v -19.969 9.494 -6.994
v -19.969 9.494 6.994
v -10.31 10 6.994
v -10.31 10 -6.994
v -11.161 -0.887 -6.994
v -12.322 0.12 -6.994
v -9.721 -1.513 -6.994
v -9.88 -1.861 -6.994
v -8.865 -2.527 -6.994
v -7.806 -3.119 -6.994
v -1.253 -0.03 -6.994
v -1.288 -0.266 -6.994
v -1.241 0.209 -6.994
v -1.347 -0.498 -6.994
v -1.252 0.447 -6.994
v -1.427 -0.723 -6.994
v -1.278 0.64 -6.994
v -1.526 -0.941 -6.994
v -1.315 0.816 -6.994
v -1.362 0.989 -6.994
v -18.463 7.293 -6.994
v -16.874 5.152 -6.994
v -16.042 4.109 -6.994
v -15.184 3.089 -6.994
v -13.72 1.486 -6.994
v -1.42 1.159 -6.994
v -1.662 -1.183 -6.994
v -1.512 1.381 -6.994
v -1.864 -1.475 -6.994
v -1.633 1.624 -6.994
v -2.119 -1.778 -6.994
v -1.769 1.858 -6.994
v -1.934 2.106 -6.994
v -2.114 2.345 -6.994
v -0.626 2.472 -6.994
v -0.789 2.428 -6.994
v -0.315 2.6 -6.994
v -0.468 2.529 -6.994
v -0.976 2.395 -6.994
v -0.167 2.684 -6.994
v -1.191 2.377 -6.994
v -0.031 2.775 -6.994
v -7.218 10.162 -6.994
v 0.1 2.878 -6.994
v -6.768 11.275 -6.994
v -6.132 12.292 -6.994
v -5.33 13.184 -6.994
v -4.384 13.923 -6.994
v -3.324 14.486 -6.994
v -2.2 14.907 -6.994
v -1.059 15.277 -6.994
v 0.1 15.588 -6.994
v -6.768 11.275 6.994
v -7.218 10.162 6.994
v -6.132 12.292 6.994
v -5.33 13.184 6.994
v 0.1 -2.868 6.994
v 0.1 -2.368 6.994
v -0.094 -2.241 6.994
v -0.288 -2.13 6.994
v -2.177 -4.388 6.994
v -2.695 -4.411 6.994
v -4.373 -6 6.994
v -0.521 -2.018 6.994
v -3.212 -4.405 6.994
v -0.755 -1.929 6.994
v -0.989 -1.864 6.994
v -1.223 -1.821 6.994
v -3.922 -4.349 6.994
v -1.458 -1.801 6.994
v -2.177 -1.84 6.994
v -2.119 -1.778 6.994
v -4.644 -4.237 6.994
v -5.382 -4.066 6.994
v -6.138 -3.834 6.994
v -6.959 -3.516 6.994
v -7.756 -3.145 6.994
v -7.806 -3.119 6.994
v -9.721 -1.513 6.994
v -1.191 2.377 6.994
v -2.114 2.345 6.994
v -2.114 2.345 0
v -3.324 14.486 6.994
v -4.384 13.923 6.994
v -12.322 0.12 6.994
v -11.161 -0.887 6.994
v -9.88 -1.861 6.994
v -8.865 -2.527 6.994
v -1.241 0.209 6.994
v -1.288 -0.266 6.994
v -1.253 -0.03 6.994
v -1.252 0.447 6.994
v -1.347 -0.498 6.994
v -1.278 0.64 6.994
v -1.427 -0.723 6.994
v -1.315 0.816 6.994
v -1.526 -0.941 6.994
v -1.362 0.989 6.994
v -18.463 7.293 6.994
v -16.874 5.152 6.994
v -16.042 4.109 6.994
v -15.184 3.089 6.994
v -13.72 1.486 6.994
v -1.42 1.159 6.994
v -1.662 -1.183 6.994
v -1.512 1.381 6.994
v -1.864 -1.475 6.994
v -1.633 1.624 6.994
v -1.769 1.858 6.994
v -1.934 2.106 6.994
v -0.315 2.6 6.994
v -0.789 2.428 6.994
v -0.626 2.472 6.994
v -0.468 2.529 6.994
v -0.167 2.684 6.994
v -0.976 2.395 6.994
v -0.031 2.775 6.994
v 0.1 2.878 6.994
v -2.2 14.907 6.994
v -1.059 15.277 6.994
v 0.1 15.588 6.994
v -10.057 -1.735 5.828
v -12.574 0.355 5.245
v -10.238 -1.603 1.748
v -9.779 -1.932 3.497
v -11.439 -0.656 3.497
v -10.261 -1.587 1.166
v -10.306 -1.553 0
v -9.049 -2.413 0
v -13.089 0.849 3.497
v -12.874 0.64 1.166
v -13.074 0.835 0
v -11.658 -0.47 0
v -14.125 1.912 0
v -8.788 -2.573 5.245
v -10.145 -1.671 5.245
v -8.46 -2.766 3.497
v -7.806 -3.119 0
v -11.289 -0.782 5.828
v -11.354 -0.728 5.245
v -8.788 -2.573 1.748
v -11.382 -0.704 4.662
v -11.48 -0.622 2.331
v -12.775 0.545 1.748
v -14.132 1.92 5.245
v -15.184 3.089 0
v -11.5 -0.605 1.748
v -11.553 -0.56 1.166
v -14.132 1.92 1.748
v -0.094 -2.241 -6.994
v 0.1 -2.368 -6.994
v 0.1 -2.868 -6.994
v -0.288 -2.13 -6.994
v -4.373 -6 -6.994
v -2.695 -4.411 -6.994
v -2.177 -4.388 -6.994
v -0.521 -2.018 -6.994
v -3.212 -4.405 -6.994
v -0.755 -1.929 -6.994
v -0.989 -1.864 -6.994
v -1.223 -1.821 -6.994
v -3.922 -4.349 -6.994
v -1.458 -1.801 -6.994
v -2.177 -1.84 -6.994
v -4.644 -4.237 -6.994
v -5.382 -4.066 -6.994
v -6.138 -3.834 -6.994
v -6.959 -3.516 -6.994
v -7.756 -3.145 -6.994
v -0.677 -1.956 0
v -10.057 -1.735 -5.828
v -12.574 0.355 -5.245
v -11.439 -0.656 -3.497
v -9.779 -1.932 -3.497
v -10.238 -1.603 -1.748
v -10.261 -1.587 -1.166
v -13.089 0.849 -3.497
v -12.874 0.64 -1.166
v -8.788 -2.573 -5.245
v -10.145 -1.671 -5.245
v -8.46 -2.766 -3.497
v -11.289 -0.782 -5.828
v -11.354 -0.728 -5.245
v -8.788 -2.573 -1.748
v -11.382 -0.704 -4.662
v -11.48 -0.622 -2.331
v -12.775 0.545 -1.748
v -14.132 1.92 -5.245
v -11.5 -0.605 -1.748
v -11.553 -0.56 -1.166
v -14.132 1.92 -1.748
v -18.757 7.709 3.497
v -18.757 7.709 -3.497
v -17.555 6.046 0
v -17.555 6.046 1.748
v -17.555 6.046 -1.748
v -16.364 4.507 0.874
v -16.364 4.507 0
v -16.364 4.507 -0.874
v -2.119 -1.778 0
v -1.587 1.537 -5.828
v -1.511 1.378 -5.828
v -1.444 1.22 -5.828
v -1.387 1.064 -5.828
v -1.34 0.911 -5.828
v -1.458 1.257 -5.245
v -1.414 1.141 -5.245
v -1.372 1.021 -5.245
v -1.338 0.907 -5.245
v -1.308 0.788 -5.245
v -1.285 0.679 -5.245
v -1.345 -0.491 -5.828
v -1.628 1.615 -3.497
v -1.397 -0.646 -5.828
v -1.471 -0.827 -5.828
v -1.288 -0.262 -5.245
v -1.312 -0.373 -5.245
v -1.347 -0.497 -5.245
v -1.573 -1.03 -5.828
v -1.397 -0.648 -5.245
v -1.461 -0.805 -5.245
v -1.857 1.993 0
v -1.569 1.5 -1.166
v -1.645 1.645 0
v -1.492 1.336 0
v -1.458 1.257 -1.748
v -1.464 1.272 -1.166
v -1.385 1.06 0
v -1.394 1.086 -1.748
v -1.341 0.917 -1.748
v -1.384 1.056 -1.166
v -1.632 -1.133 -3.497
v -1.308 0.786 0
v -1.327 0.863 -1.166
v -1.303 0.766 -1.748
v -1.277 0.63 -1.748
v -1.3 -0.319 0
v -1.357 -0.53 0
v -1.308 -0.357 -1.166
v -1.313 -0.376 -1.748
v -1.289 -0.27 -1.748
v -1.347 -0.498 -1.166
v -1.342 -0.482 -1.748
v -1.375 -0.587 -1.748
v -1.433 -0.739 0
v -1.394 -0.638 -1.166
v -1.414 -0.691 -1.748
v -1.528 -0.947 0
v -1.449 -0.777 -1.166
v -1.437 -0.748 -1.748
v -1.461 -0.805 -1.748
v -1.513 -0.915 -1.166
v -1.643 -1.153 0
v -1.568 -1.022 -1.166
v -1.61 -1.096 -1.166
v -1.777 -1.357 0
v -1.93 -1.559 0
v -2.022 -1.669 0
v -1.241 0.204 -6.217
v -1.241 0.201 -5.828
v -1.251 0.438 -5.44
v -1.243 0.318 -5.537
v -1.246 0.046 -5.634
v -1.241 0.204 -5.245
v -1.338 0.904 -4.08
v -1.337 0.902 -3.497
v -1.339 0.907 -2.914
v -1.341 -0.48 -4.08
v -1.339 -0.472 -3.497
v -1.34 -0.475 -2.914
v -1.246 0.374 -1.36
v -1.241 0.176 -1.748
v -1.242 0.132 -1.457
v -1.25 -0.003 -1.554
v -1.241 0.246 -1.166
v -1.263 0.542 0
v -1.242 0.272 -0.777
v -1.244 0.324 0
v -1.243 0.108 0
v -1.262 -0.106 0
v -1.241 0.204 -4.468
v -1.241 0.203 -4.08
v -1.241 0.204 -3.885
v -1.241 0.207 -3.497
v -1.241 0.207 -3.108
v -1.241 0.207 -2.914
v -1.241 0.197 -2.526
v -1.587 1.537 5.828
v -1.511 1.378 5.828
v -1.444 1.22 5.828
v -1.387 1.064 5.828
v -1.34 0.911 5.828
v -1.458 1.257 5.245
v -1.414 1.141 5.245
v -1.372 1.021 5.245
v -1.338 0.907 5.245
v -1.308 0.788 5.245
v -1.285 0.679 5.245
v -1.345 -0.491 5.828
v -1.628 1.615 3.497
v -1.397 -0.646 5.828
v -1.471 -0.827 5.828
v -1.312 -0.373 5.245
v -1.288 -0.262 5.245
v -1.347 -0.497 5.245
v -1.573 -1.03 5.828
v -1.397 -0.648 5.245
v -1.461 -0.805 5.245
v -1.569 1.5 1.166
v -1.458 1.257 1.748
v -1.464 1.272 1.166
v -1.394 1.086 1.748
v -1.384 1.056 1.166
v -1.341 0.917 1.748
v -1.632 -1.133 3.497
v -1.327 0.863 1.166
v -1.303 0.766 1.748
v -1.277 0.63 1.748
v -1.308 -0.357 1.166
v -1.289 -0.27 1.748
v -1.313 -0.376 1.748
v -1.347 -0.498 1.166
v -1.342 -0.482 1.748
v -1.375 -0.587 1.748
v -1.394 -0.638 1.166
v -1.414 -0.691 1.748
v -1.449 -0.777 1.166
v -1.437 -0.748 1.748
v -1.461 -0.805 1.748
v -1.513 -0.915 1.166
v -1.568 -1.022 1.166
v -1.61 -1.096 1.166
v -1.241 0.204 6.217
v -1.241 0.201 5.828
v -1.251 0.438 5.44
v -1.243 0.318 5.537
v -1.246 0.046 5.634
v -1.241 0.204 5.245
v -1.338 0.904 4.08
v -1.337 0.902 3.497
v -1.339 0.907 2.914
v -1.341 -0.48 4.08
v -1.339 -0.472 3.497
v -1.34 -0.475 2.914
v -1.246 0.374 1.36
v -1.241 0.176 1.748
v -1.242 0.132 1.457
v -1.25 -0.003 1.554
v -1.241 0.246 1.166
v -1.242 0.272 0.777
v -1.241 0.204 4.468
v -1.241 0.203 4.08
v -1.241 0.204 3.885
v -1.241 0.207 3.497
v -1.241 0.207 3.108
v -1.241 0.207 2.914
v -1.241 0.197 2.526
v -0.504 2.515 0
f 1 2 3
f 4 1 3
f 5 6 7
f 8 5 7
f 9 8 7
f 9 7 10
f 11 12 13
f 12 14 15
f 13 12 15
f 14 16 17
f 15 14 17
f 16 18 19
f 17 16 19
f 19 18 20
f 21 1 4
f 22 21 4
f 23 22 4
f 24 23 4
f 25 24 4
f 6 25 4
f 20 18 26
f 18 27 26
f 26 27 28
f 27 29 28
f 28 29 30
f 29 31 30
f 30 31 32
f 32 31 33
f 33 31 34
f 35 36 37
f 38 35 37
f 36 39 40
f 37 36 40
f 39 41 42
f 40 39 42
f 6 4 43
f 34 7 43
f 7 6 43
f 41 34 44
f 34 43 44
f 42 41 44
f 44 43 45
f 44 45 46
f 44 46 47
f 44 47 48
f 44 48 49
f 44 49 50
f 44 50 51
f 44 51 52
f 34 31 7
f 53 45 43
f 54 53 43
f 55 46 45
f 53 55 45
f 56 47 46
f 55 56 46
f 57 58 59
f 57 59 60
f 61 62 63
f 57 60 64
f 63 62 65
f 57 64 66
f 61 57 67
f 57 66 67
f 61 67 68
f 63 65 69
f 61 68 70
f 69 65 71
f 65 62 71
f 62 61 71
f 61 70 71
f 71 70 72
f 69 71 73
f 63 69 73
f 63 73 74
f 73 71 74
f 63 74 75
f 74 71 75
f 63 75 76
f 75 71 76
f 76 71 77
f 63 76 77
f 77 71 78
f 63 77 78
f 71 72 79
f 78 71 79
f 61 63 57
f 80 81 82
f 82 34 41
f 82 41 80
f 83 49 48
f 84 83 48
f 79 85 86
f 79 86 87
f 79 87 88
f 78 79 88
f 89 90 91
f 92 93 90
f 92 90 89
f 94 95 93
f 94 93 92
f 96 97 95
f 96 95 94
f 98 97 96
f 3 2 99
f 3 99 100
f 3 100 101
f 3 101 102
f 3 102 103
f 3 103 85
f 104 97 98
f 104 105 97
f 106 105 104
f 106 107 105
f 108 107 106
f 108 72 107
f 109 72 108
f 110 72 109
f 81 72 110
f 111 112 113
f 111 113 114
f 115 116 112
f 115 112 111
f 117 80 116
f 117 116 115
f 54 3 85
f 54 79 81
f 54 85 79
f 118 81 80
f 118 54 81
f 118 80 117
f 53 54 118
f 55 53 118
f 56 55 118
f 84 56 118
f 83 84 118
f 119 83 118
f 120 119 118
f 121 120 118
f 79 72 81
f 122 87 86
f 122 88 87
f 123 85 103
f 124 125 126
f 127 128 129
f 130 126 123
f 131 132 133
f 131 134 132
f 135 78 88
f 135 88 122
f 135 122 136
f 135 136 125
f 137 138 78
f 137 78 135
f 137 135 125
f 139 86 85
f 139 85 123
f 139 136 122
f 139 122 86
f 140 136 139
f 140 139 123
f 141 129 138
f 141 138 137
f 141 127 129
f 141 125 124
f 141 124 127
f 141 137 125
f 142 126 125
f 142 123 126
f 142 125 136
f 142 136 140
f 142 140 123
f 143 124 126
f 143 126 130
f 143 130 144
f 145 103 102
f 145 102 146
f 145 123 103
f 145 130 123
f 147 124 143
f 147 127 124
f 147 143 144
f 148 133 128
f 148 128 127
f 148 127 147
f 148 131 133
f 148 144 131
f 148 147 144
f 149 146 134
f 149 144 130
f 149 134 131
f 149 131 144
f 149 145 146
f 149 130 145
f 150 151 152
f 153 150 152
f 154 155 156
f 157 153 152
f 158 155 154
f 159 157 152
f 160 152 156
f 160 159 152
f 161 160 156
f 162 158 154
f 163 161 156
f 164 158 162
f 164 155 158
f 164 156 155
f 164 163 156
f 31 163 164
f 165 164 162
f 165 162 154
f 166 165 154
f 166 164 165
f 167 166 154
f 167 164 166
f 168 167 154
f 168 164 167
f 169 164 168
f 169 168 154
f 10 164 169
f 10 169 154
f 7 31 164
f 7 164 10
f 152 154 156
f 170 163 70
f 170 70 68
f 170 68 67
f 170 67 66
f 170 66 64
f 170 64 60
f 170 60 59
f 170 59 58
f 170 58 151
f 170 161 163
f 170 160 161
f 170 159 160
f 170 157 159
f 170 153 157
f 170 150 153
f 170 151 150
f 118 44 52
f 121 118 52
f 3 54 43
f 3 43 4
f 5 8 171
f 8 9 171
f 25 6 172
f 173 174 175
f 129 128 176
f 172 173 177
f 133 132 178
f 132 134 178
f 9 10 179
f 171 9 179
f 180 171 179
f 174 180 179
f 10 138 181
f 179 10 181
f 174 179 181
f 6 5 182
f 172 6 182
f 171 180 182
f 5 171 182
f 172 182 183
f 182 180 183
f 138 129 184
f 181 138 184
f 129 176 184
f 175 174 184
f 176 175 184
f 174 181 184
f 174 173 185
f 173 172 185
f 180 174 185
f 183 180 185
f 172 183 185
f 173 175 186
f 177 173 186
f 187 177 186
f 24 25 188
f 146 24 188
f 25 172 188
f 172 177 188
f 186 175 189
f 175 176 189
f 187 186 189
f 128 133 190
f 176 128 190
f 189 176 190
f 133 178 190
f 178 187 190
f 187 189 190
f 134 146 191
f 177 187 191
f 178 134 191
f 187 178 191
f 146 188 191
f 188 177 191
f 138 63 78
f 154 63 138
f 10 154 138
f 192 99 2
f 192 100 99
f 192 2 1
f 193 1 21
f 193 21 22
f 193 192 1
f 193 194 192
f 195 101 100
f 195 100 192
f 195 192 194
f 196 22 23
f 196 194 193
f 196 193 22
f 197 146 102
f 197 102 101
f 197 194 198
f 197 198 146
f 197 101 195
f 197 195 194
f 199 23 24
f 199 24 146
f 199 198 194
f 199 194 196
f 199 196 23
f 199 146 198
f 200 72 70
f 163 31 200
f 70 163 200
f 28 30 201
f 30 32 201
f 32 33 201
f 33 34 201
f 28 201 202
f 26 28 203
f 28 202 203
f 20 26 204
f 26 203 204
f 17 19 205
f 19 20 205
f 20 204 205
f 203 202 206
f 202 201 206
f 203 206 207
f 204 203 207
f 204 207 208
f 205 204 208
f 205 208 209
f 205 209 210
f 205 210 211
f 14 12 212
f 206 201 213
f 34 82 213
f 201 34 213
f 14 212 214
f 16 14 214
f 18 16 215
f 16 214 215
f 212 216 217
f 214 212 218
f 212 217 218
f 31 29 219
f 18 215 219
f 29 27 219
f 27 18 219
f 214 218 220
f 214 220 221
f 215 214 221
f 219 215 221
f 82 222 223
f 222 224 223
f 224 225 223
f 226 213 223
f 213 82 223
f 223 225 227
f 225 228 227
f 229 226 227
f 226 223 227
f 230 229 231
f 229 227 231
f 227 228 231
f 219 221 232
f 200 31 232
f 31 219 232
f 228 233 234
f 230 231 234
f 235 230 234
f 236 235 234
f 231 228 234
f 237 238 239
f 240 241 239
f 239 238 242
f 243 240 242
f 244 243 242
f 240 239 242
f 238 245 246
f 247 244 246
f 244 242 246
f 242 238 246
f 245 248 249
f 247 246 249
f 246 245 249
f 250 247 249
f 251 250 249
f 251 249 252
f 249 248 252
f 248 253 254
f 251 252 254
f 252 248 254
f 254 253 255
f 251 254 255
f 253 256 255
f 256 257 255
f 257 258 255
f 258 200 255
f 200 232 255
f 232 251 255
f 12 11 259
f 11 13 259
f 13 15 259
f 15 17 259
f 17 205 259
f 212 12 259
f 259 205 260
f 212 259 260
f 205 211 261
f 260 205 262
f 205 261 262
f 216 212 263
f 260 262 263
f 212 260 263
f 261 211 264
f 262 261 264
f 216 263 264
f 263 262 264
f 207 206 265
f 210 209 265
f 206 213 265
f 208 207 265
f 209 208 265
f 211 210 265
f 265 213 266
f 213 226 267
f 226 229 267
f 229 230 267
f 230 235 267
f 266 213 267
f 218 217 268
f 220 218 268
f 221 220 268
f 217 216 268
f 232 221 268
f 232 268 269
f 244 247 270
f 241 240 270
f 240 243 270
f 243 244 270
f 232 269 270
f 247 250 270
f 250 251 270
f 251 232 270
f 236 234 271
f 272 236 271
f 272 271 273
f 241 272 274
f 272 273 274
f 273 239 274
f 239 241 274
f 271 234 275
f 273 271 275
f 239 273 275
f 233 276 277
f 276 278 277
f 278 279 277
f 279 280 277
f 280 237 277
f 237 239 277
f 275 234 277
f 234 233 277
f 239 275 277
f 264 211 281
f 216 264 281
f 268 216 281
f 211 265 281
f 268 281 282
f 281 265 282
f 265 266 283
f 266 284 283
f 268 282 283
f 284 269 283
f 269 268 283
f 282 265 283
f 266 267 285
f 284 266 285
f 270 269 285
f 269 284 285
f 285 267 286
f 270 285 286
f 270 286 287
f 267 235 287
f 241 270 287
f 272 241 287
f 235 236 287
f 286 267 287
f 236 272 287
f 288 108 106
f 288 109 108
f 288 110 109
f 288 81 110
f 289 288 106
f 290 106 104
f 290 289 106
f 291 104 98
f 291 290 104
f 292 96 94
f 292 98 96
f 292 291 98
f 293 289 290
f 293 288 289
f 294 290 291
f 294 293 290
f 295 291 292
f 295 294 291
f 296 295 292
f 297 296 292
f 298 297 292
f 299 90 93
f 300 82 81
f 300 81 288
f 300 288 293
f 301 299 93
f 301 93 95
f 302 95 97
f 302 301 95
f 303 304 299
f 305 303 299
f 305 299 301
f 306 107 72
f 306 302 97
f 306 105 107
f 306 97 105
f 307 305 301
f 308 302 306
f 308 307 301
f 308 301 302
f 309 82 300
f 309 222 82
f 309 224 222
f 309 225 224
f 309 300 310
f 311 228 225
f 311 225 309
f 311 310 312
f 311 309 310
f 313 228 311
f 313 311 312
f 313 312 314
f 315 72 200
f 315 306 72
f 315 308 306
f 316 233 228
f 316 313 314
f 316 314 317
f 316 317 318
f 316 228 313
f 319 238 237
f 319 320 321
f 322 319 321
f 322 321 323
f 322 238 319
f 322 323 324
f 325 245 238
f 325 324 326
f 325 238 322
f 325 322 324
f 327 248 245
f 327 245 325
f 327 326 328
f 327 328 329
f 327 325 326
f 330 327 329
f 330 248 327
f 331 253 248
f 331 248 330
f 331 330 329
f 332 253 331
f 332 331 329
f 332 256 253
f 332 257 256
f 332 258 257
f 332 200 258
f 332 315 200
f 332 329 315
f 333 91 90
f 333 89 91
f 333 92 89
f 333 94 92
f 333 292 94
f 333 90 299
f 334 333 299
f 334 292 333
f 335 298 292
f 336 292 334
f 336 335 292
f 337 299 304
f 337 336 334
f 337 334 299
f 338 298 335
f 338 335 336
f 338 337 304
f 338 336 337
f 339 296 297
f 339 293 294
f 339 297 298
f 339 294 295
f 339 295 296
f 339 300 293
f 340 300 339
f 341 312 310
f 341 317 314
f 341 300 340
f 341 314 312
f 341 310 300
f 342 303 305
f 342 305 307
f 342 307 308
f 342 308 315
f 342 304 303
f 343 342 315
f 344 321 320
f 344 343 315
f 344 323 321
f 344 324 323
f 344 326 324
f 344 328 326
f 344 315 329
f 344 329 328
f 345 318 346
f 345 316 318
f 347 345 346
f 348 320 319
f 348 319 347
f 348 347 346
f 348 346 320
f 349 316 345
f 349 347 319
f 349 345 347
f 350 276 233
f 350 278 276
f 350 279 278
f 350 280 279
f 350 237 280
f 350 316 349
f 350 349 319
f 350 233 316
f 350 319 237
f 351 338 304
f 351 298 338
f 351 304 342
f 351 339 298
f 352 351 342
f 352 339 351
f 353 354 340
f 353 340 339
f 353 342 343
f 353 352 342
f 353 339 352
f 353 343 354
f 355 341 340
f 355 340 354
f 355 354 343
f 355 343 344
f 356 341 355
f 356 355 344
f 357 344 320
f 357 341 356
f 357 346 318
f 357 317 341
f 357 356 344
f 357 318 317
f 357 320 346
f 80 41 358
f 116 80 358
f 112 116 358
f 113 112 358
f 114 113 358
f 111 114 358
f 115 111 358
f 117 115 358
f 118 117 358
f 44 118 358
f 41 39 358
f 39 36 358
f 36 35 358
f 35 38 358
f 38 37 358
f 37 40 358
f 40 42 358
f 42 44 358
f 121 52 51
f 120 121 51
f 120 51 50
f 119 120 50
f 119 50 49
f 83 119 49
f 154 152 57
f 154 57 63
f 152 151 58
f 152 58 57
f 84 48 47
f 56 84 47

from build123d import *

# Parameters (mm, degrees)
CROQUIS_BASE_DEPTH             = 6.9937
LENTE_PPAL_1_REACH             = 29.176
LENTE_PPAL_1_DIRECTION_2_REACH = 29.176
LENTE_PPAL_2_DEPTH             = 28.175928622
LENTE_PPAL_2_DEPTH_BACK        = 28.175928622
CROQUIS9_3_OUTSIDE_W           = 30.065
CROQUIS9_3_OUTSIDE_H           = 25.937
LENTE_START                    = -6.9937
LENTE_FRONTAL_DEPTH            = 13.9874
LENTE_START_2                  = -6.993701
LENTE_TRASERA_DEPTH            = 13.987402


with BuildPart() as part:
    # Croquis1 → croquis base (new, symmetric)
    with BuildSketch(Plane.XY):
        with BuildLine():
            Line((-8.981845695, 12.608155172), (-23.035921146, 11.871612288))
            Line((-23.035921146, 11.871612288), (-23.035921146, 11.54013782))
            ThreePointArc((-23.035921146, 11.54013782), (-20.949684518, 9.582335705), (-18.945192114, 7.540918896))
            add(Edge.make_bspline(
                [(-18.945192114, 7.540918896), (-10.215008384, -3.697644103), (-2.846604825, -5.059081104)],
                knots=[0.497667241, 0.497667241, 0.497667241, 0.49955428, 0.49955428, 0.49955428], degree=2, weights=[1, 1, 1]))
            add(Edge.make_bspline(
                [(-2.846604825, -5.059081104), (-2.498165198, -4.87297933), (-2.177330418, -4.684462446)],
                knots=[0.498812075, 0.498812075, 0.498812075, 0.498911556, 0.498911556, 0.498911556], degree=2, weights=[1, 1, 1]))
            Line((-2.177330418, -4.684462446), (-2.177330418, 6.186438919))
            add(Edge.make_bspline(
                [(-2.177330418, 6.186438919), (-4.063319702, 8.141636997), (-6.994875026, 10.477389992)],
                knots=[0.50138293, 0.50138293, 0.50138293, 0.502013312, 0.502013312, 0.502013312], degree=2, weights=[1, 1, 1]))
            Line((-6.994875026, 10.477389992), (-8.981845695, 12.608155172))
        make_face()
    extrude(amount=CROQUIS_BASE_DEPTH, both=True)

    # lente ppal 1: up to this face of the body (flat: up to its plane)
    lente_ppal_1_end = Plane(part.part.faces().sort_by_distance((-10.153546236, 5.159655325, 6.9937))[0])
    # Croquis9 → lente ppal 1 (add, up to the picked face)
    with BuildSketch(Plane.XY, mode=Mode.PRIVATE) as lente_ppal_1_sk1:
        with BuildLine():
            add(Edge.make_bspline(
                [(-2.177330418, -4.388282022), (-10.4130765, -4.994158739), (-19.969359014, 9.493765032)],
                knots=[0, 0, 0, 1, 1, 1], degree=2))
            Line((-19.969359014, 9.493765032), (-10.309820395, 10))
            Line((-10.309820395, 10), (-2.177330418, 6.082860828))
            Line((-2.177330418, 6.082860828), (-2.177330418, 2.424232079))
            add(Edge.make_bspline(
                [(-2.177330418, 2.424232079), (-0.304369248, 0.128042884), (-2.177330418, -1.840420572)],
                knots=[0, 0, 0, 1, 1, 1], degree=2))
            Line((-2.177330418, -1.840420572), (-2.177330418, -4.388282022))
        make_face()
    lente_ppal_1_tool1 = split(extrude(lente_ppal_1_sk1.sketch, amount=LENTE_PPAL_1_REACH, mode=Mode.PRIVATE), bisect_by=lente_ppal_1_end, keep=Keep.BOTH, mode=Mode.PRIVATE)
    add(lente_ppal_1_tool1.solids().sort_by(Axis((-9.106368, 3.599172, 0), (0, 0, 1)))[0])

    # lente ppal 1 direction 2: up to this face of the body (flat: up to its plane)
    lente_ppal_1_direction_2_end = Plane(part.part.faces().sort_by_distance((-10.153546236, 5.159655325, -6.9937))[0])
    # Croquis9 → lente ppal 1 direction 2 (add, up to the picked face)
    with BuildSketch(Plane.XY, mode=Mode.PRIVATE) as lente_ppal_1_direction_2_sk1:
        with BuildLine():
            add(Edge.make_bspline(
                [(-2.177330418, -4.388282022), (-10.4130765, -4.994158739), (-19.969359014, 9.493765032)],
                knots=[0, 0, 0, 1, 1, 1], degree=2))
            Line((-19.969359014, 9.493765032), (-10.309820395, 10))
            Line((-10.309820395, 10), (-2.177330418, 6.082860828))
            Line((-2.177330418, 6.082860828), (-2.177330418, 2.424232079))
            add(Edge.make_bspline(
                [(-2.177330418, 2.424232079), (-0.304369248, 0.128042884), (-2.177330418, -1.840420572)],
                knots=[0, 0, 0, 1, 1, 1], degree=2))
            Line((-2.177330418, -1.840420572), (-2.177330418, -4.388282022))
        make_face()
    lente_ppal_1_direction_2_tool1 = split(extrude(lente_ppal_1_direction_2_sk1.sketch, amount=-LENTE_PPAL_1_DIRECTION_2_REACH, mode=Mode.PRIVATE), bisect_by=lente_ppal_1_direction_2_end, keep=Keep.BOTH, mode=Mode.PRIVATE)
    add(lente_ppal_1_direction_2_tool1.solids().sort_by(Axis((-9.106368, 3.599172, 0), (0, 0, -1)))[0])

    # Croquis9<3> outside → lente ppal 2 (cut, two sides: drawn at the far end of the back side and taken through both)
    with BuildSketch(Plane.XY.offset(-LENTE_PPAL_2_DEPTH_BACK)):
        with Locations((-12.1385, 3.7745)):
            Rectangle(CROQUIS9_3_OUTSIDE_W, CROQUIS9_3_OUTSIDE_H)
        with BuildLine():
            Line((-2.177330418, -1.840420572), (-2.177330418, -4.388282022))
            add(Edge.make_bspline(
                [(-2.177330418, -4.388282022), (-10.4130765, -4.994158739), (-19.969359014, 9.493765032)],
                knots=[0, 0, 0, 1, 1, 1], degree=2))
            Line((-19.969359014, 9.493765032), (-10.309820395, 10))
            Line((-10.309820395, 10), (-2.177330418, 6.082860828))
            Line((-2.177330418, 6.082860828), (-2.177330418, 2.424232079))
            add(Edge.make_bspline(
                [(-2.177330418, 2.424232079), (-0.304369248, 0.128042884), (-2.177330418, -1.840420572)],
                knots=[0, 0, 0, 1, 1, 1], degree=2))
        make_face(mode=Mode.SUBTRACT)
    extrude(amount=LENTE_PPAL_2_DEPTH + LENTE_PPAL_2_DEPTH_BACK, mode=Mode.SUBTRACT)

    # Croquis8 → lente frontal (add)
    with BuildSketch(Plane.XY.offset(LENTE_START)):
        with BuildLine():
            Line((0.1, 2.877673418), (0.1, 15.587903347))
            Line((0.1, 15.587903347), (-1.059110992, 15.277320493))
            Line((-1.059110992, 15.277320493), (-2.200378811, 14.9065001))
            Line((-2.200378811, 14.9065001), (-3.324385438, 14.486251242))
            Line((-3.324385438, 14.486251242), (-4.38392255, 13.922885367))
            Line((-4.38392255, 13.922885367), (-5.329535454, 13.184091597))
            Line((-5.329535454, 13.184091597), (-6.132492182, 12.292317806))
            Line((-6.132492182, 12.292317806), (-6.768395299, 11.274660091))
            Line((-6.768395299, 11.274660091), (-7.217923211, 10.162039465))
            Line((-7.217923211, 10.162039465), (-10.309820395, 10))
            Line((-10.309820395, 10), (-2.177330418, 2.342487007))
            Line((-2.177330418, 2.342487007), (-1.190501641, 2.376947827))
            add(Edge.make_bspline(
                [(-1.190501641, 2.376947827), (-0.463368169, 2.402339888), (0.1, 2.877673418)],
                knots=[0, 0, 0, 1, 1, 1], degree=2))
        make_face()
    extrude(amount=LENTE_FRONTAL_DEPTH)

    # Croquis11 → lente trasera (add)
    with BuildSketch(Plane.XY.offset(LENTE_START_2)):
        with BuildLine():
            Line((0.1, -2.367807069), (0.1, -2.867807069))
            Line((0.1, -2.867807069), (-4.373235091, -6))
            Line((-4.373235091, -6), (-9.72117641, -1.512544411))
            Line((-9.72117641, -1.512544411), (-1.458120605, -1.801096678))
            add(Edge.make_bspline(
                [(-1.458120605, -1.801096678), (-0.674591915, -1.828458103), (0.1, -2.367807069)],
                knots=[0, 0, 0, 1, 1, 1], degree=2))
        make_face()
    extrude(amount=LENTE_TRASERA_DEPTH)


solid = part.part
